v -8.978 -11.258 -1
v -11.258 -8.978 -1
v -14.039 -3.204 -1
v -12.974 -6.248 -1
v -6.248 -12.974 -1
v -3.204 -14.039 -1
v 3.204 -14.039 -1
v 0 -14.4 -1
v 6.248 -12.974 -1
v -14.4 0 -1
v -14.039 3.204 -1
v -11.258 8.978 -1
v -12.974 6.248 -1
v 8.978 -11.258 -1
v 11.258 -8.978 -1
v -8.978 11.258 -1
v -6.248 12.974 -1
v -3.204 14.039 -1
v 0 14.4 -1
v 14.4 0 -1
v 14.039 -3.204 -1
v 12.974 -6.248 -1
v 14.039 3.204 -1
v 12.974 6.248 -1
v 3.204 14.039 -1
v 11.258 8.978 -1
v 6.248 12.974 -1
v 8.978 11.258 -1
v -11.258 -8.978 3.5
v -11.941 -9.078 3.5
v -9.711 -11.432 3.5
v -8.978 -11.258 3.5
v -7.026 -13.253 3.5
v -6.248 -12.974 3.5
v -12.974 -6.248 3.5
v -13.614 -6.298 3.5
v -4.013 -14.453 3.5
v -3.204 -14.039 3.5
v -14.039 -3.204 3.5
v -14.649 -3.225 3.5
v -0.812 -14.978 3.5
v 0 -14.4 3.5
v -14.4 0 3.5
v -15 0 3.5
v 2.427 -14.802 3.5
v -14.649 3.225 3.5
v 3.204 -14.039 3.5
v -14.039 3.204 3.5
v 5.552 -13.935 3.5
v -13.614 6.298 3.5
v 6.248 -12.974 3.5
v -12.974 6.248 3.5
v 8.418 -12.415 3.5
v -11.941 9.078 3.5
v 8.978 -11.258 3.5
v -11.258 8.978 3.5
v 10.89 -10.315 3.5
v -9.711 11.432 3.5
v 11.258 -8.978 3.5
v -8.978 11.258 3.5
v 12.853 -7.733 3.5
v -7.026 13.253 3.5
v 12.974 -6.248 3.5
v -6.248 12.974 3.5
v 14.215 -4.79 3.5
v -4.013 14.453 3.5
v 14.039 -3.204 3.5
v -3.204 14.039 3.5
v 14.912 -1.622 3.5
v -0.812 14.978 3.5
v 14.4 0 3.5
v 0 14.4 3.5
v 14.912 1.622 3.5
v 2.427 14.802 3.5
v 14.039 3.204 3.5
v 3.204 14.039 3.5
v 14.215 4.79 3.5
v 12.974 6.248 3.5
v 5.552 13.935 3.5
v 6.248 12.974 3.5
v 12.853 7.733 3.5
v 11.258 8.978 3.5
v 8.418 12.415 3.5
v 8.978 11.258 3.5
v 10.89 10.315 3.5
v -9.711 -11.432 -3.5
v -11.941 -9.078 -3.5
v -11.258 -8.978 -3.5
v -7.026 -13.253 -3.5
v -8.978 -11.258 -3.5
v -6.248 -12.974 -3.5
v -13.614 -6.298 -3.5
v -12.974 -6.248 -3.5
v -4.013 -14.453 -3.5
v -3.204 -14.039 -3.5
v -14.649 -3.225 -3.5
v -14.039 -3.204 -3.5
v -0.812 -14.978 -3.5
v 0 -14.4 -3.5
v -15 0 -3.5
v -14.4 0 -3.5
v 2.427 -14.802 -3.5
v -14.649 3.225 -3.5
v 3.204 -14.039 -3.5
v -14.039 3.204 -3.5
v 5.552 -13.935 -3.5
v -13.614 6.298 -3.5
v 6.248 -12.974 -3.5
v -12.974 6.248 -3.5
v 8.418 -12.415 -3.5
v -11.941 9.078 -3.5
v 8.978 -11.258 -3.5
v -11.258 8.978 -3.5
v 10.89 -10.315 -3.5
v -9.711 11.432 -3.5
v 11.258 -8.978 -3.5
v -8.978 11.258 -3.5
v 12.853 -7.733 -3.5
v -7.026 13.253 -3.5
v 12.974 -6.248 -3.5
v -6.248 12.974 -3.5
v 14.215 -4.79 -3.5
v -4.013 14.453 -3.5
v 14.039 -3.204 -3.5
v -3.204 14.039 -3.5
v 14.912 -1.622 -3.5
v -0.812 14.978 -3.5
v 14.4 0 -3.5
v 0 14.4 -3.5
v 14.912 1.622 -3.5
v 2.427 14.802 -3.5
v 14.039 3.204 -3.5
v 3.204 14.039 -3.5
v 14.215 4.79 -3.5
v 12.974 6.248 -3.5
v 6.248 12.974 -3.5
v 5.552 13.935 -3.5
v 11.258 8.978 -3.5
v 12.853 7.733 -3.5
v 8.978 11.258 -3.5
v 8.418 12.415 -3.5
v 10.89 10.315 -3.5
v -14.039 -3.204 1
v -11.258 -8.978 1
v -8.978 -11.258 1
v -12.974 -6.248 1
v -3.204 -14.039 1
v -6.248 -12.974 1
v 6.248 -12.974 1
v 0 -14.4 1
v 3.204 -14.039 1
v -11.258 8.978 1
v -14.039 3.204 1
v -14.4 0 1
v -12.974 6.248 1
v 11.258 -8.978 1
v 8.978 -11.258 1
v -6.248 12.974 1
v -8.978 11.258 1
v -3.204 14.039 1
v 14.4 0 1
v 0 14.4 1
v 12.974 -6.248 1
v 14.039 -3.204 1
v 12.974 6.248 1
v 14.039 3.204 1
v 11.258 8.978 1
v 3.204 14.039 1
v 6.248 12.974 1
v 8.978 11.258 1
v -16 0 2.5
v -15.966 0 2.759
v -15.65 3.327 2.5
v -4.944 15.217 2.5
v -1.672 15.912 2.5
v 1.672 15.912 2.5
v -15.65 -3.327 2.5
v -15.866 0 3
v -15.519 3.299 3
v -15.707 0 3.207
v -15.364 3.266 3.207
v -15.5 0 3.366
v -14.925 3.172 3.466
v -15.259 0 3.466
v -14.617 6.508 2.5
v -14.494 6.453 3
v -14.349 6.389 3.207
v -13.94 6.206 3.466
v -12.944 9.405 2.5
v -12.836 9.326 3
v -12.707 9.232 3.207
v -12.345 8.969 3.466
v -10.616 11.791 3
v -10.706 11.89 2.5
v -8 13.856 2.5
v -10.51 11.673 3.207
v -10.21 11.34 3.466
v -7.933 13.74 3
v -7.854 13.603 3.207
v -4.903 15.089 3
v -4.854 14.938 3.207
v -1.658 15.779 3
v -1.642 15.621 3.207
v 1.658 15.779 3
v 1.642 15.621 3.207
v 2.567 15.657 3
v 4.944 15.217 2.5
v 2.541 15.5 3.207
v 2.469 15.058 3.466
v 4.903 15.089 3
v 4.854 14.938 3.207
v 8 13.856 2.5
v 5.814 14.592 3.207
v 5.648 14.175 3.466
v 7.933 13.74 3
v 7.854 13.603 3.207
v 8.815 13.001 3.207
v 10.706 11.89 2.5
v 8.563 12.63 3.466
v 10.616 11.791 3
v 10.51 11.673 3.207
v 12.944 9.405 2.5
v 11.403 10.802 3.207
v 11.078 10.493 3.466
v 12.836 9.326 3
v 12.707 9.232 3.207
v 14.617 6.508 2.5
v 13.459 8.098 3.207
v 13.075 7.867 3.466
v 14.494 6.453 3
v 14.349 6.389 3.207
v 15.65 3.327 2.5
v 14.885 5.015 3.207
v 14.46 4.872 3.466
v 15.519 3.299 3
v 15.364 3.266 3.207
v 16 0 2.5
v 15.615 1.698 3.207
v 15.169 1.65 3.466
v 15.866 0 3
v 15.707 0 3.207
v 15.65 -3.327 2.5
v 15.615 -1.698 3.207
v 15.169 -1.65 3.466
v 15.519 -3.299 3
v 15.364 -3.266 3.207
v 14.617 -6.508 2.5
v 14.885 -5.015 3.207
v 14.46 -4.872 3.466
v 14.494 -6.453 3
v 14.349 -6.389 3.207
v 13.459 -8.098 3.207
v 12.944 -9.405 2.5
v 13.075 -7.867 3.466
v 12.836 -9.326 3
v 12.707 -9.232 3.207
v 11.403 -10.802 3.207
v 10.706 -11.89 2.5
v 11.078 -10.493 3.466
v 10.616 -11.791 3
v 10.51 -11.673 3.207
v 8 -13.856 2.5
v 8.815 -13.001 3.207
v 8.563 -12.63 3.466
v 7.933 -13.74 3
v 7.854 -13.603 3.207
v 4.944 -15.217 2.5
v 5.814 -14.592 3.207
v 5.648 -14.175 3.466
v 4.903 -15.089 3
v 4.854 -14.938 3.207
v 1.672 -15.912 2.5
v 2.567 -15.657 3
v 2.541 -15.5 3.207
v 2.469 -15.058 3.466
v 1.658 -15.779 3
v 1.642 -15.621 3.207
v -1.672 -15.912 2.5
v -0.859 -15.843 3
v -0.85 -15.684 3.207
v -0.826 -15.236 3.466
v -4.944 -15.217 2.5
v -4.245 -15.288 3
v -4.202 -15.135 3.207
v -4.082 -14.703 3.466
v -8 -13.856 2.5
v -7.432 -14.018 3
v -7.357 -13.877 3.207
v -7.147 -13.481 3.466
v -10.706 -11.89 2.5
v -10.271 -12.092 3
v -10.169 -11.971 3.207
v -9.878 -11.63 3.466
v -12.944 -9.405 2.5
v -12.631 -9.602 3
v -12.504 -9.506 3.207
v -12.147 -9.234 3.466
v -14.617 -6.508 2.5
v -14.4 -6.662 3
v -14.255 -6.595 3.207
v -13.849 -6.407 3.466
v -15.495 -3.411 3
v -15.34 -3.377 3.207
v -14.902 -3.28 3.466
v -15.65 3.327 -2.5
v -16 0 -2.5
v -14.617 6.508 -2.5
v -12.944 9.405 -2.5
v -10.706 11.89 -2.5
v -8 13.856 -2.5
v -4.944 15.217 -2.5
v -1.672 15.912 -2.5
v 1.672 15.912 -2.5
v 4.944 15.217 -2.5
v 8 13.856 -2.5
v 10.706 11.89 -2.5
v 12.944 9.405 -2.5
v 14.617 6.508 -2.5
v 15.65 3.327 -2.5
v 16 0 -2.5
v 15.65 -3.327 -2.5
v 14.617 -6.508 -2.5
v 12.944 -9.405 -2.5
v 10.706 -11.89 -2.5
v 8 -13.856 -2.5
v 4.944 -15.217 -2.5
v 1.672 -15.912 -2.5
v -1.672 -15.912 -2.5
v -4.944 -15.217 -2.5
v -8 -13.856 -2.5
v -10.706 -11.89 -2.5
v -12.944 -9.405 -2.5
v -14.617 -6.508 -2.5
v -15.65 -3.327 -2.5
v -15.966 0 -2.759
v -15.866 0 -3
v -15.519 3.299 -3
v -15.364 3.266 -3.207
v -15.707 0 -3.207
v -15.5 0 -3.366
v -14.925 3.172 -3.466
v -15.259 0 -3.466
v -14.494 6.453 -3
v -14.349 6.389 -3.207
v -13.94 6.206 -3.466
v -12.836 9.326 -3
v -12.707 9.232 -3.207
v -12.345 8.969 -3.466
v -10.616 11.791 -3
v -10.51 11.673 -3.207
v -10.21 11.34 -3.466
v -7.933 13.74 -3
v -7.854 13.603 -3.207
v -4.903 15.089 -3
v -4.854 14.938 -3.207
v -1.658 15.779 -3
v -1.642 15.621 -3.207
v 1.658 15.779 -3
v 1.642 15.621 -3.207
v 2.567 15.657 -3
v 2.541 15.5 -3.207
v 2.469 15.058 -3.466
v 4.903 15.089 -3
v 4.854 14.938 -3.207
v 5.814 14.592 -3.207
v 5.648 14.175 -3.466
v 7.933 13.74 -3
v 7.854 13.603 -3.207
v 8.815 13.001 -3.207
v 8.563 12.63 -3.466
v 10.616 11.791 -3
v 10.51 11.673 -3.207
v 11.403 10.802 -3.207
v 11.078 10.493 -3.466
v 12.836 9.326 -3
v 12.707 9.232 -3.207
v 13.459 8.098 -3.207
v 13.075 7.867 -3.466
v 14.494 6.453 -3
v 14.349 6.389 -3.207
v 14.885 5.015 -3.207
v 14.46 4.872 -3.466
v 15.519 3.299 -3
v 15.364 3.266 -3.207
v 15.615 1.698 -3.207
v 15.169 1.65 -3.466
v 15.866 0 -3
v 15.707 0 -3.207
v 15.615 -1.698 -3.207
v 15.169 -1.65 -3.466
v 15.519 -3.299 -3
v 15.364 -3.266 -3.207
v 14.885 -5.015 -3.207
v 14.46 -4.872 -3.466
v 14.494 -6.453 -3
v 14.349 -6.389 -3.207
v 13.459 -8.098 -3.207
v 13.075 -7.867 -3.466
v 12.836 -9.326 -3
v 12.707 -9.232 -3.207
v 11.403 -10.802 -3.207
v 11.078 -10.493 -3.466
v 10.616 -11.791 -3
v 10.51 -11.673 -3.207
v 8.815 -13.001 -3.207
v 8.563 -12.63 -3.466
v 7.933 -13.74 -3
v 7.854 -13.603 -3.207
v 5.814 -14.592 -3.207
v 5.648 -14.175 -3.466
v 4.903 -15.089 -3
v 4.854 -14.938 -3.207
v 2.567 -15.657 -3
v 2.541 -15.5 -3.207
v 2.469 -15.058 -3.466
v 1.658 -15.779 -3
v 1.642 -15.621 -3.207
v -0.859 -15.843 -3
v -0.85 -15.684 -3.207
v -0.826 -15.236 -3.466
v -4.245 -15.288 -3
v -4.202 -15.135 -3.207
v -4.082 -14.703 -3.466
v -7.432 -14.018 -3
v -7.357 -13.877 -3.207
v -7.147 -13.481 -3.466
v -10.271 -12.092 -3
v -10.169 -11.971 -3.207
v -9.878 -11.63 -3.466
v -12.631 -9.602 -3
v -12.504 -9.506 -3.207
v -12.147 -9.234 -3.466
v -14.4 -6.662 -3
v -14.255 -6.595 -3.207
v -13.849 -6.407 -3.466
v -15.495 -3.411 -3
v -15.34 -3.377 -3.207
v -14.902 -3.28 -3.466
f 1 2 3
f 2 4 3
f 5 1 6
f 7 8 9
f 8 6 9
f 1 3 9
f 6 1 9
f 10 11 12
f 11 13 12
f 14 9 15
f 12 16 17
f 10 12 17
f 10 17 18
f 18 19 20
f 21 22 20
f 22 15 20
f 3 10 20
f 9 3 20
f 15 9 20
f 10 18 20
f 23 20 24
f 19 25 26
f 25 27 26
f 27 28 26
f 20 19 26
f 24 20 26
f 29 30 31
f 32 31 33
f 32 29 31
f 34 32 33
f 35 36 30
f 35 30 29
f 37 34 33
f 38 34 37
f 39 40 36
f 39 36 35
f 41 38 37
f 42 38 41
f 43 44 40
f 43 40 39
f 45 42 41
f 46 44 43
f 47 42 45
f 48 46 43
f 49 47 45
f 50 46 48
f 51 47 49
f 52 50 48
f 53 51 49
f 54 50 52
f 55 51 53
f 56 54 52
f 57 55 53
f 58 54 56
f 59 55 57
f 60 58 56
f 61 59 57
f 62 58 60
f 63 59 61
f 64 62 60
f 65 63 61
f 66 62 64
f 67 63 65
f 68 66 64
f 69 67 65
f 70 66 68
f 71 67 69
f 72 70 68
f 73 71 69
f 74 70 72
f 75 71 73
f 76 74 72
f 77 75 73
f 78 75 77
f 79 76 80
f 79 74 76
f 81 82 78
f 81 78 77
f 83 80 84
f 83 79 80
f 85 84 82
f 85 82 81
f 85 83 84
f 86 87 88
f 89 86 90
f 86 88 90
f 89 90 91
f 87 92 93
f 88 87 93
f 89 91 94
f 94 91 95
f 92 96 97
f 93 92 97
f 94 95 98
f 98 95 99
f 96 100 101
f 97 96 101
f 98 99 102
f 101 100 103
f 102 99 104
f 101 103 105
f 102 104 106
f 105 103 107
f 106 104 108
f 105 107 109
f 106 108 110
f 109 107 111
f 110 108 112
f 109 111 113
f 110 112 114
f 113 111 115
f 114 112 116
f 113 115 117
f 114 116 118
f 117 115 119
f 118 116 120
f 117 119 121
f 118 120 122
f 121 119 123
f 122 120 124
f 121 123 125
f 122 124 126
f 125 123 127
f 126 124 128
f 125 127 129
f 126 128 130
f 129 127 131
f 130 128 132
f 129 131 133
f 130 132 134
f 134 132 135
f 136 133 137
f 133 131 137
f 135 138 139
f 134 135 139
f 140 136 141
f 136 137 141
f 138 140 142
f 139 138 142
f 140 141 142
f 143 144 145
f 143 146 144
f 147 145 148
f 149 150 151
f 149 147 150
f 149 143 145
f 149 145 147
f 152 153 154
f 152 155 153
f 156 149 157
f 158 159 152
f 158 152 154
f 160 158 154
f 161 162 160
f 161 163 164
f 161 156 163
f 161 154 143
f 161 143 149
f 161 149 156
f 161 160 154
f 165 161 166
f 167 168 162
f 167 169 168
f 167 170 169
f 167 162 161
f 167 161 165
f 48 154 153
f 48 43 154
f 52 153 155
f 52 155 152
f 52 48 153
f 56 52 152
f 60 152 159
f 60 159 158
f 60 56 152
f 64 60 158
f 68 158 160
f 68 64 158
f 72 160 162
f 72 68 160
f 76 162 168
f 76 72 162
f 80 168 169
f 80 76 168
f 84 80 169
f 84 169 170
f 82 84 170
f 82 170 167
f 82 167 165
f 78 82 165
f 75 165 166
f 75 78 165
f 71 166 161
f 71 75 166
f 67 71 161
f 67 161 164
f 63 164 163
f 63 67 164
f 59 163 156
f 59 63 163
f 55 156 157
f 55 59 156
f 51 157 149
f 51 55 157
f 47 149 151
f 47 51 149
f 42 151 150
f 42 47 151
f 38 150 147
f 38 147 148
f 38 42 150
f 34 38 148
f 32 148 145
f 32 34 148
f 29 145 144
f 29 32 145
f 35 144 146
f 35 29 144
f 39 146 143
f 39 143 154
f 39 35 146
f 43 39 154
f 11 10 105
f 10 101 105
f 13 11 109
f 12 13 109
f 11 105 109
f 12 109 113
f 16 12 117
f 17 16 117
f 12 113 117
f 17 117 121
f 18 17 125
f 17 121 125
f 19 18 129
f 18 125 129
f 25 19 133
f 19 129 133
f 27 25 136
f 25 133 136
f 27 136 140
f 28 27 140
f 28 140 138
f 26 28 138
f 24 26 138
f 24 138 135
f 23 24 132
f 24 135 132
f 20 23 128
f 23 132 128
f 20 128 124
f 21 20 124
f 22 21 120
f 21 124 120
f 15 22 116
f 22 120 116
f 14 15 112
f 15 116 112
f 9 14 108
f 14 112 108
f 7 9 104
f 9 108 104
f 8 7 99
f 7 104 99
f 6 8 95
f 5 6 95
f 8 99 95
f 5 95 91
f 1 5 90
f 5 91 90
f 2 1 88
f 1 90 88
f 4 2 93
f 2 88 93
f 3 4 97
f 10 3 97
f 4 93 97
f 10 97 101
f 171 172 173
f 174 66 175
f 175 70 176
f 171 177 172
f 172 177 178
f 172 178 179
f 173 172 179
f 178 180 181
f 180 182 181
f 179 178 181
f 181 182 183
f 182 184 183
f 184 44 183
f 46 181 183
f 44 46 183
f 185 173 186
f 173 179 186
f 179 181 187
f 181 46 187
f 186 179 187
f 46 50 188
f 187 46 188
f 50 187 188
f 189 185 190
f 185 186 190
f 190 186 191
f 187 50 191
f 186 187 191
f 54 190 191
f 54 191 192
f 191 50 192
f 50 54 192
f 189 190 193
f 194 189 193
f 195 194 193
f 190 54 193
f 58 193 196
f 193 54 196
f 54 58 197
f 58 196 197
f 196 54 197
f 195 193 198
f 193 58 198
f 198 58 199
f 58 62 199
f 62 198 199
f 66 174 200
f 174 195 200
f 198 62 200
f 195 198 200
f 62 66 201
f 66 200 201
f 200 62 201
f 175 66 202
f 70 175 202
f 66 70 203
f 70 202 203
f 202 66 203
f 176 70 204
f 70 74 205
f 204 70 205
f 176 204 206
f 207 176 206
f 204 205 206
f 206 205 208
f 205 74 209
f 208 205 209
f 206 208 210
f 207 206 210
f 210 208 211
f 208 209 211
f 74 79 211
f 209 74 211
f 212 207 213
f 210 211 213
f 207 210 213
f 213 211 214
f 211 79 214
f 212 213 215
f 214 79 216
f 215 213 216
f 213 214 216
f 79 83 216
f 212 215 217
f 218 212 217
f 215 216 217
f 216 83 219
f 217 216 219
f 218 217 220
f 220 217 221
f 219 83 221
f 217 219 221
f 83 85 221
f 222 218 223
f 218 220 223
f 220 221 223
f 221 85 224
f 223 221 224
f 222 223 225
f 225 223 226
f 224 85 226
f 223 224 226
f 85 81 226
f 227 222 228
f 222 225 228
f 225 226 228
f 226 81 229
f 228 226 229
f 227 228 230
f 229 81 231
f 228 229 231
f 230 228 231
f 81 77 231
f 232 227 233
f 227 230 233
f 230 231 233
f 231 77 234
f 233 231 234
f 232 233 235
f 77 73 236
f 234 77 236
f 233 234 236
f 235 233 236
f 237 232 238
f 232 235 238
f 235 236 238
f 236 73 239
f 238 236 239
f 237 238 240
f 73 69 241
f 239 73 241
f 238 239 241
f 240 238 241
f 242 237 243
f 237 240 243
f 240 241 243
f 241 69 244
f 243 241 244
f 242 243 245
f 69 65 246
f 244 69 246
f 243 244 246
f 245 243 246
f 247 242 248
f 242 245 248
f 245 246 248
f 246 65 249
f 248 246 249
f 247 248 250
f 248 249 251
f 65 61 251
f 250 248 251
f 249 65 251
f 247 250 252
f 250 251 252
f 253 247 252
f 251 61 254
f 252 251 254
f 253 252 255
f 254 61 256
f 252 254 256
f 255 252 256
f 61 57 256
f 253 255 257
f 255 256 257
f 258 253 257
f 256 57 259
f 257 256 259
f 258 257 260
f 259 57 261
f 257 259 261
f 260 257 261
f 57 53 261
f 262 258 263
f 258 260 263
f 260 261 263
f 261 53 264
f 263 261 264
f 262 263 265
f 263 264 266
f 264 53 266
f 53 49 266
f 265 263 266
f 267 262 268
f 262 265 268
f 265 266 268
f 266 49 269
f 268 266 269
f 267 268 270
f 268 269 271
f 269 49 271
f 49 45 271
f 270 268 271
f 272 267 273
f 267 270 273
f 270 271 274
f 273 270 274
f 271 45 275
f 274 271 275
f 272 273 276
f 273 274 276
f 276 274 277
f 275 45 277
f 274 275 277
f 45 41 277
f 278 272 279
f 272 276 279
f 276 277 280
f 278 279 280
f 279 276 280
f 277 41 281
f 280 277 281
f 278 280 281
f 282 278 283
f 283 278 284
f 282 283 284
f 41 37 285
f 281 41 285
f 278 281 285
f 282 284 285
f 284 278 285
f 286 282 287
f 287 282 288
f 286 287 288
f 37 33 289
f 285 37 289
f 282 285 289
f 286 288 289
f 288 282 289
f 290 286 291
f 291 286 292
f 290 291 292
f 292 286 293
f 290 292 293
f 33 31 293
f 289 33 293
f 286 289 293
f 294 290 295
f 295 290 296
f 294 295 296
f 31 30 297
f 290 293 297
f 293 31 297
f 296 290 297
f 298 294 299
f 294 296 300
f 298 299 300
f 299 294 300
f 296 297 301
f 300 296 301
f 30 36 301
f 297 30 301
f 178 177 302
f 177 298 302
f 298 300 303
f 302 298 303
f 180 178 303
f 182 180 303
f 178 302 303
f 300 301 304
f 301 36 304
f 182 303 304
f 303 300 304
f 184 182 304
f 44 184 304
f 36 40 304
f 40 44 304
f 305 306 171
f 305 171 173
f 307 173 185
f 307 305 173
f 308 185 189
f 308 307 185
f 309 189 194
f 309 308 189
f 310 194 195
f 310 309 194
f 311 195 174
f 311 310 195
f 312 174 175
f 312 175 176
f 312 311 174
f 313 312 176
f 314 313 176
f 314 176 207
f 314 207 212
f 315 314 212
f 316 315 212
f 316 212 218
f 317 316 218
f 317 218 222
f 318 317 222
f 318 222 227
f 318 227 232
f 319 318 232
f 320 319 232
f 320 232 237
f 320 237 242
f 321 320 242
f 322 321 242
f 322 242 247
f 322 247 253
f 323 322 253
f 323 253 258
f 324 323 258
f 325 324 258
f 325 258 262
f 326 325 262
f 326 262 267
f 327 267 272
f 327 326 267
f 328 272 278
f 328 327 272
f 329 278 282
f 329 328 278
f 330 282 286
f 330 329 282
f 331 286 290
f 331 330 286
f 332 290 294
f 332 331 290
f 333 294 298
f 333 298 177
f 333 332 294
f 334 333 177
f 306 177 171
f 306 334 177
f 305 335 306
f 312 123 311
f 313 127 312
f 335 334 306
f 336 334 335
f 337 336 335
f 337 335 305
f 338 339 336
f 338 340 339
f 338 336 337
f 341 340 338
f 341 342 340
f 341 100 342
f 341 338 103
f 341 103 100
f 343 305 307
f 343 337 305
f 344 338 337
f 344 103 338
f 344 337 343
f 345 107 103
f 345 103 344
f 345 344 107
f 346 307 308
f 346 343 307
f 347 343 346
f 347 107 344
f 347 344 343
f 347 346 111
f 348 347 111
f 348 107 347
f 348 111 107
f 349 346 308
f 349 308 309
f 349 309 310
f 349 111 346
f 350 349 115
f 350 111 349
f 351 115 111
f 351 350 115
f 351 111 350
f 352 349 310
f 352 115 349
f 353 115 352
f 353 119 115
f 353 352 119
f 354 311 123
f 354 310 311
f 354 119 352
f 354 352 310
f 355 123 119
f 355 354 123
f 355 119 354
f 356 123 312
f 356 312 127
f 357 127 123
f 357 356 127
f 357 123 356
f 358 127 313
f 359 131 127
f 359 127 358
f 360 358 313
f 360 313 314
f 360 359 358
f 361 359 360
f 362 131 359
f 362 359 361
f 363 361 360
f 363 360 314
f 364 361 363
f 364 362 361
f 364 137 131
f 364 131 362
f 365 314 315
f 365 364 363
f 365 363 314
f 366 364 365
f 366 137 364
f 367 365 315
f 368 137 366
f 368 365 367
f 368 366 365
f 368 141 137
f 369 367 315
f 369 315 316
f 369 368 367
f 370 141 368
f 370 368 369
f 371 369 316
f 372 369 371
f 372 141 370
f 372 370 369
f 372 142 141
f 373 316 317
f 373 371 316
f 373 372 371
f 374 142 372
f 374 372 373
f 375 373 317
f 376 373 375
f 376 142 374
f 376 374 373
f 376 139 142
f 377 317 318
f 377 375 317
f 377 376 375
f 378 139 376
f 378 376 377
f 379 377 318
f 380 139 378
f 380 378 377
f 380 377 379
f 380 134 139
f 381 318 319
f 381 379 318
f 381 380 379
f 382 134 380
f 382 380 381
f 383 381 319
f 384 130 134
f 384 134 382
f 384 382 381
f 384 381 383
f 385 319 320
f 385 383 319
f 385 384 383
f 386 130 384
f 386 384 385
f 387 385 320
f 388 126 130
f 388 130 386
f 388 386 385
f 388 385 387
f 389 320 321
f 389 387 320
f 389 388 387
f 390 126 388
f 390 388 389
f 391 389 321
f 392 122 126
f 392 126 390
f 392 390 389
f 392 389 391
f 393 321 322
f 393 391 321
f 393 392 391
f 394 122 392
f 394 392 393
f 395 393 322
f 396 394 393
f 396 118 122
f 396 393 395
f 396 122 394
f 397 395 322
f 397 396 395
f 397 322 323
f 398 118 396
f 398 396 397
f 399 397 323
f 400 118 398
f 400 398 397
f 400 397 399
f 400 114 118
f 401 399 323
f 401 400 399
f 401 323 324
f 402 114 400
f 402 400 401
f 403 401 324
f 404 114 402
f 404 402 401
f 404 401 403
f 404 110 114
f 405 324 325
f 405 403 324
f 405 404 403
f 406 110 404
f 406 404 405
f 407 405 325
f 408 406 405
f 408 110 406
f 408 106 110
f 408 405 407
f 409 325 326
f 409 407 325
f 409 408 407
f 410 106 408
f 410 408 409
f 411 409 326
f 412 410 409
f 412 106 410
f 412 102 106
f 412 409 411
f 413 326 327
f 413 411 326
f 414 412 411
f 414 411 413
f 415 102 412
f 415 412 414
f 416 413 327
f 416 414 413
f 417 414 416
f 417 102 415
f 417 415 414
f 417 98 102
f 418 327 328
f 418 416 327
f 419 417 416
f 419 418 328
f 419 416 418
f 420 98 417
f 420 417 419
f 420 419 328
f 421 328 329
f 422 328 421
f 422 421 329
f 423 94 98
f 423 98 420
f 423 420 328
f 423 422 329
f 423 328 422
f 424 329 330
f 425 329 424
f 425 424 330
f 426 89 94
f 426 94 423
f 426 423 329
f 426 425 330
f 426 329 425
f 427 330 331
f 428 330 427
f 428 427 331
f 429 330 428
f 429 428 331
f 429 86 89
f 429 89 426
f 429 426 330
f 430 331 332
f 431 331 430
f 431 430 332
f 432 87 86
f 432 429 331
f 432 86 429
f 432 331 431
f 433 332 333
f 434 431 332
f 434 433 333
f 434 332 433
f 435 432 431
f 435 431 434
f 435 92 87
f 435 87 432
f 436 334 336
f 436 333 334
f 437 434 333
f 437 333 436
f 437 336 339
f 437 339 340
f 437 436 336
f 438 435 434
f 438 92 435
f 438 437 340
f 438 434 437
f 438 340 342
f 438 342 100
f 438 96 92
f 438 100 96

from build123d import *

# Parameters (mm, degrees)
F3_R = 1
F4_R = 1


with BuildPart() as f1:
    # F0 (on Front) → F1 (revolve)
    with BuildSketch(Plane.XZ):
        Polygon((-16, 0), (0, 0), (0, 1), (-14.4, 1), (-14.4, 3.5), (-16, 3.5), align=None)
    revolve(axis=Axis((0, 0, -1.1237002909), (0, 0, -1)))

    # F2: F1 across plane


with BuildPart() as f1_1:
    add(f1.part)
    add(f1.part.mirror(Plane.XY))

    # F3
    f3_edges = [f1_1.edges().sort_by_distance(p)[0] for p in [
        (16, 0, 3.5),
    ]]
    fillet(f3_edges, radius=F3_R)

    # F4
    f4_edges = [f1_1.edges().sort_by_distance(p)[0] for p in [
        (16, 0, -3.5),
    ]]
    fillet(f4_edges, radius=F4_R)


solid = f1_1.part
